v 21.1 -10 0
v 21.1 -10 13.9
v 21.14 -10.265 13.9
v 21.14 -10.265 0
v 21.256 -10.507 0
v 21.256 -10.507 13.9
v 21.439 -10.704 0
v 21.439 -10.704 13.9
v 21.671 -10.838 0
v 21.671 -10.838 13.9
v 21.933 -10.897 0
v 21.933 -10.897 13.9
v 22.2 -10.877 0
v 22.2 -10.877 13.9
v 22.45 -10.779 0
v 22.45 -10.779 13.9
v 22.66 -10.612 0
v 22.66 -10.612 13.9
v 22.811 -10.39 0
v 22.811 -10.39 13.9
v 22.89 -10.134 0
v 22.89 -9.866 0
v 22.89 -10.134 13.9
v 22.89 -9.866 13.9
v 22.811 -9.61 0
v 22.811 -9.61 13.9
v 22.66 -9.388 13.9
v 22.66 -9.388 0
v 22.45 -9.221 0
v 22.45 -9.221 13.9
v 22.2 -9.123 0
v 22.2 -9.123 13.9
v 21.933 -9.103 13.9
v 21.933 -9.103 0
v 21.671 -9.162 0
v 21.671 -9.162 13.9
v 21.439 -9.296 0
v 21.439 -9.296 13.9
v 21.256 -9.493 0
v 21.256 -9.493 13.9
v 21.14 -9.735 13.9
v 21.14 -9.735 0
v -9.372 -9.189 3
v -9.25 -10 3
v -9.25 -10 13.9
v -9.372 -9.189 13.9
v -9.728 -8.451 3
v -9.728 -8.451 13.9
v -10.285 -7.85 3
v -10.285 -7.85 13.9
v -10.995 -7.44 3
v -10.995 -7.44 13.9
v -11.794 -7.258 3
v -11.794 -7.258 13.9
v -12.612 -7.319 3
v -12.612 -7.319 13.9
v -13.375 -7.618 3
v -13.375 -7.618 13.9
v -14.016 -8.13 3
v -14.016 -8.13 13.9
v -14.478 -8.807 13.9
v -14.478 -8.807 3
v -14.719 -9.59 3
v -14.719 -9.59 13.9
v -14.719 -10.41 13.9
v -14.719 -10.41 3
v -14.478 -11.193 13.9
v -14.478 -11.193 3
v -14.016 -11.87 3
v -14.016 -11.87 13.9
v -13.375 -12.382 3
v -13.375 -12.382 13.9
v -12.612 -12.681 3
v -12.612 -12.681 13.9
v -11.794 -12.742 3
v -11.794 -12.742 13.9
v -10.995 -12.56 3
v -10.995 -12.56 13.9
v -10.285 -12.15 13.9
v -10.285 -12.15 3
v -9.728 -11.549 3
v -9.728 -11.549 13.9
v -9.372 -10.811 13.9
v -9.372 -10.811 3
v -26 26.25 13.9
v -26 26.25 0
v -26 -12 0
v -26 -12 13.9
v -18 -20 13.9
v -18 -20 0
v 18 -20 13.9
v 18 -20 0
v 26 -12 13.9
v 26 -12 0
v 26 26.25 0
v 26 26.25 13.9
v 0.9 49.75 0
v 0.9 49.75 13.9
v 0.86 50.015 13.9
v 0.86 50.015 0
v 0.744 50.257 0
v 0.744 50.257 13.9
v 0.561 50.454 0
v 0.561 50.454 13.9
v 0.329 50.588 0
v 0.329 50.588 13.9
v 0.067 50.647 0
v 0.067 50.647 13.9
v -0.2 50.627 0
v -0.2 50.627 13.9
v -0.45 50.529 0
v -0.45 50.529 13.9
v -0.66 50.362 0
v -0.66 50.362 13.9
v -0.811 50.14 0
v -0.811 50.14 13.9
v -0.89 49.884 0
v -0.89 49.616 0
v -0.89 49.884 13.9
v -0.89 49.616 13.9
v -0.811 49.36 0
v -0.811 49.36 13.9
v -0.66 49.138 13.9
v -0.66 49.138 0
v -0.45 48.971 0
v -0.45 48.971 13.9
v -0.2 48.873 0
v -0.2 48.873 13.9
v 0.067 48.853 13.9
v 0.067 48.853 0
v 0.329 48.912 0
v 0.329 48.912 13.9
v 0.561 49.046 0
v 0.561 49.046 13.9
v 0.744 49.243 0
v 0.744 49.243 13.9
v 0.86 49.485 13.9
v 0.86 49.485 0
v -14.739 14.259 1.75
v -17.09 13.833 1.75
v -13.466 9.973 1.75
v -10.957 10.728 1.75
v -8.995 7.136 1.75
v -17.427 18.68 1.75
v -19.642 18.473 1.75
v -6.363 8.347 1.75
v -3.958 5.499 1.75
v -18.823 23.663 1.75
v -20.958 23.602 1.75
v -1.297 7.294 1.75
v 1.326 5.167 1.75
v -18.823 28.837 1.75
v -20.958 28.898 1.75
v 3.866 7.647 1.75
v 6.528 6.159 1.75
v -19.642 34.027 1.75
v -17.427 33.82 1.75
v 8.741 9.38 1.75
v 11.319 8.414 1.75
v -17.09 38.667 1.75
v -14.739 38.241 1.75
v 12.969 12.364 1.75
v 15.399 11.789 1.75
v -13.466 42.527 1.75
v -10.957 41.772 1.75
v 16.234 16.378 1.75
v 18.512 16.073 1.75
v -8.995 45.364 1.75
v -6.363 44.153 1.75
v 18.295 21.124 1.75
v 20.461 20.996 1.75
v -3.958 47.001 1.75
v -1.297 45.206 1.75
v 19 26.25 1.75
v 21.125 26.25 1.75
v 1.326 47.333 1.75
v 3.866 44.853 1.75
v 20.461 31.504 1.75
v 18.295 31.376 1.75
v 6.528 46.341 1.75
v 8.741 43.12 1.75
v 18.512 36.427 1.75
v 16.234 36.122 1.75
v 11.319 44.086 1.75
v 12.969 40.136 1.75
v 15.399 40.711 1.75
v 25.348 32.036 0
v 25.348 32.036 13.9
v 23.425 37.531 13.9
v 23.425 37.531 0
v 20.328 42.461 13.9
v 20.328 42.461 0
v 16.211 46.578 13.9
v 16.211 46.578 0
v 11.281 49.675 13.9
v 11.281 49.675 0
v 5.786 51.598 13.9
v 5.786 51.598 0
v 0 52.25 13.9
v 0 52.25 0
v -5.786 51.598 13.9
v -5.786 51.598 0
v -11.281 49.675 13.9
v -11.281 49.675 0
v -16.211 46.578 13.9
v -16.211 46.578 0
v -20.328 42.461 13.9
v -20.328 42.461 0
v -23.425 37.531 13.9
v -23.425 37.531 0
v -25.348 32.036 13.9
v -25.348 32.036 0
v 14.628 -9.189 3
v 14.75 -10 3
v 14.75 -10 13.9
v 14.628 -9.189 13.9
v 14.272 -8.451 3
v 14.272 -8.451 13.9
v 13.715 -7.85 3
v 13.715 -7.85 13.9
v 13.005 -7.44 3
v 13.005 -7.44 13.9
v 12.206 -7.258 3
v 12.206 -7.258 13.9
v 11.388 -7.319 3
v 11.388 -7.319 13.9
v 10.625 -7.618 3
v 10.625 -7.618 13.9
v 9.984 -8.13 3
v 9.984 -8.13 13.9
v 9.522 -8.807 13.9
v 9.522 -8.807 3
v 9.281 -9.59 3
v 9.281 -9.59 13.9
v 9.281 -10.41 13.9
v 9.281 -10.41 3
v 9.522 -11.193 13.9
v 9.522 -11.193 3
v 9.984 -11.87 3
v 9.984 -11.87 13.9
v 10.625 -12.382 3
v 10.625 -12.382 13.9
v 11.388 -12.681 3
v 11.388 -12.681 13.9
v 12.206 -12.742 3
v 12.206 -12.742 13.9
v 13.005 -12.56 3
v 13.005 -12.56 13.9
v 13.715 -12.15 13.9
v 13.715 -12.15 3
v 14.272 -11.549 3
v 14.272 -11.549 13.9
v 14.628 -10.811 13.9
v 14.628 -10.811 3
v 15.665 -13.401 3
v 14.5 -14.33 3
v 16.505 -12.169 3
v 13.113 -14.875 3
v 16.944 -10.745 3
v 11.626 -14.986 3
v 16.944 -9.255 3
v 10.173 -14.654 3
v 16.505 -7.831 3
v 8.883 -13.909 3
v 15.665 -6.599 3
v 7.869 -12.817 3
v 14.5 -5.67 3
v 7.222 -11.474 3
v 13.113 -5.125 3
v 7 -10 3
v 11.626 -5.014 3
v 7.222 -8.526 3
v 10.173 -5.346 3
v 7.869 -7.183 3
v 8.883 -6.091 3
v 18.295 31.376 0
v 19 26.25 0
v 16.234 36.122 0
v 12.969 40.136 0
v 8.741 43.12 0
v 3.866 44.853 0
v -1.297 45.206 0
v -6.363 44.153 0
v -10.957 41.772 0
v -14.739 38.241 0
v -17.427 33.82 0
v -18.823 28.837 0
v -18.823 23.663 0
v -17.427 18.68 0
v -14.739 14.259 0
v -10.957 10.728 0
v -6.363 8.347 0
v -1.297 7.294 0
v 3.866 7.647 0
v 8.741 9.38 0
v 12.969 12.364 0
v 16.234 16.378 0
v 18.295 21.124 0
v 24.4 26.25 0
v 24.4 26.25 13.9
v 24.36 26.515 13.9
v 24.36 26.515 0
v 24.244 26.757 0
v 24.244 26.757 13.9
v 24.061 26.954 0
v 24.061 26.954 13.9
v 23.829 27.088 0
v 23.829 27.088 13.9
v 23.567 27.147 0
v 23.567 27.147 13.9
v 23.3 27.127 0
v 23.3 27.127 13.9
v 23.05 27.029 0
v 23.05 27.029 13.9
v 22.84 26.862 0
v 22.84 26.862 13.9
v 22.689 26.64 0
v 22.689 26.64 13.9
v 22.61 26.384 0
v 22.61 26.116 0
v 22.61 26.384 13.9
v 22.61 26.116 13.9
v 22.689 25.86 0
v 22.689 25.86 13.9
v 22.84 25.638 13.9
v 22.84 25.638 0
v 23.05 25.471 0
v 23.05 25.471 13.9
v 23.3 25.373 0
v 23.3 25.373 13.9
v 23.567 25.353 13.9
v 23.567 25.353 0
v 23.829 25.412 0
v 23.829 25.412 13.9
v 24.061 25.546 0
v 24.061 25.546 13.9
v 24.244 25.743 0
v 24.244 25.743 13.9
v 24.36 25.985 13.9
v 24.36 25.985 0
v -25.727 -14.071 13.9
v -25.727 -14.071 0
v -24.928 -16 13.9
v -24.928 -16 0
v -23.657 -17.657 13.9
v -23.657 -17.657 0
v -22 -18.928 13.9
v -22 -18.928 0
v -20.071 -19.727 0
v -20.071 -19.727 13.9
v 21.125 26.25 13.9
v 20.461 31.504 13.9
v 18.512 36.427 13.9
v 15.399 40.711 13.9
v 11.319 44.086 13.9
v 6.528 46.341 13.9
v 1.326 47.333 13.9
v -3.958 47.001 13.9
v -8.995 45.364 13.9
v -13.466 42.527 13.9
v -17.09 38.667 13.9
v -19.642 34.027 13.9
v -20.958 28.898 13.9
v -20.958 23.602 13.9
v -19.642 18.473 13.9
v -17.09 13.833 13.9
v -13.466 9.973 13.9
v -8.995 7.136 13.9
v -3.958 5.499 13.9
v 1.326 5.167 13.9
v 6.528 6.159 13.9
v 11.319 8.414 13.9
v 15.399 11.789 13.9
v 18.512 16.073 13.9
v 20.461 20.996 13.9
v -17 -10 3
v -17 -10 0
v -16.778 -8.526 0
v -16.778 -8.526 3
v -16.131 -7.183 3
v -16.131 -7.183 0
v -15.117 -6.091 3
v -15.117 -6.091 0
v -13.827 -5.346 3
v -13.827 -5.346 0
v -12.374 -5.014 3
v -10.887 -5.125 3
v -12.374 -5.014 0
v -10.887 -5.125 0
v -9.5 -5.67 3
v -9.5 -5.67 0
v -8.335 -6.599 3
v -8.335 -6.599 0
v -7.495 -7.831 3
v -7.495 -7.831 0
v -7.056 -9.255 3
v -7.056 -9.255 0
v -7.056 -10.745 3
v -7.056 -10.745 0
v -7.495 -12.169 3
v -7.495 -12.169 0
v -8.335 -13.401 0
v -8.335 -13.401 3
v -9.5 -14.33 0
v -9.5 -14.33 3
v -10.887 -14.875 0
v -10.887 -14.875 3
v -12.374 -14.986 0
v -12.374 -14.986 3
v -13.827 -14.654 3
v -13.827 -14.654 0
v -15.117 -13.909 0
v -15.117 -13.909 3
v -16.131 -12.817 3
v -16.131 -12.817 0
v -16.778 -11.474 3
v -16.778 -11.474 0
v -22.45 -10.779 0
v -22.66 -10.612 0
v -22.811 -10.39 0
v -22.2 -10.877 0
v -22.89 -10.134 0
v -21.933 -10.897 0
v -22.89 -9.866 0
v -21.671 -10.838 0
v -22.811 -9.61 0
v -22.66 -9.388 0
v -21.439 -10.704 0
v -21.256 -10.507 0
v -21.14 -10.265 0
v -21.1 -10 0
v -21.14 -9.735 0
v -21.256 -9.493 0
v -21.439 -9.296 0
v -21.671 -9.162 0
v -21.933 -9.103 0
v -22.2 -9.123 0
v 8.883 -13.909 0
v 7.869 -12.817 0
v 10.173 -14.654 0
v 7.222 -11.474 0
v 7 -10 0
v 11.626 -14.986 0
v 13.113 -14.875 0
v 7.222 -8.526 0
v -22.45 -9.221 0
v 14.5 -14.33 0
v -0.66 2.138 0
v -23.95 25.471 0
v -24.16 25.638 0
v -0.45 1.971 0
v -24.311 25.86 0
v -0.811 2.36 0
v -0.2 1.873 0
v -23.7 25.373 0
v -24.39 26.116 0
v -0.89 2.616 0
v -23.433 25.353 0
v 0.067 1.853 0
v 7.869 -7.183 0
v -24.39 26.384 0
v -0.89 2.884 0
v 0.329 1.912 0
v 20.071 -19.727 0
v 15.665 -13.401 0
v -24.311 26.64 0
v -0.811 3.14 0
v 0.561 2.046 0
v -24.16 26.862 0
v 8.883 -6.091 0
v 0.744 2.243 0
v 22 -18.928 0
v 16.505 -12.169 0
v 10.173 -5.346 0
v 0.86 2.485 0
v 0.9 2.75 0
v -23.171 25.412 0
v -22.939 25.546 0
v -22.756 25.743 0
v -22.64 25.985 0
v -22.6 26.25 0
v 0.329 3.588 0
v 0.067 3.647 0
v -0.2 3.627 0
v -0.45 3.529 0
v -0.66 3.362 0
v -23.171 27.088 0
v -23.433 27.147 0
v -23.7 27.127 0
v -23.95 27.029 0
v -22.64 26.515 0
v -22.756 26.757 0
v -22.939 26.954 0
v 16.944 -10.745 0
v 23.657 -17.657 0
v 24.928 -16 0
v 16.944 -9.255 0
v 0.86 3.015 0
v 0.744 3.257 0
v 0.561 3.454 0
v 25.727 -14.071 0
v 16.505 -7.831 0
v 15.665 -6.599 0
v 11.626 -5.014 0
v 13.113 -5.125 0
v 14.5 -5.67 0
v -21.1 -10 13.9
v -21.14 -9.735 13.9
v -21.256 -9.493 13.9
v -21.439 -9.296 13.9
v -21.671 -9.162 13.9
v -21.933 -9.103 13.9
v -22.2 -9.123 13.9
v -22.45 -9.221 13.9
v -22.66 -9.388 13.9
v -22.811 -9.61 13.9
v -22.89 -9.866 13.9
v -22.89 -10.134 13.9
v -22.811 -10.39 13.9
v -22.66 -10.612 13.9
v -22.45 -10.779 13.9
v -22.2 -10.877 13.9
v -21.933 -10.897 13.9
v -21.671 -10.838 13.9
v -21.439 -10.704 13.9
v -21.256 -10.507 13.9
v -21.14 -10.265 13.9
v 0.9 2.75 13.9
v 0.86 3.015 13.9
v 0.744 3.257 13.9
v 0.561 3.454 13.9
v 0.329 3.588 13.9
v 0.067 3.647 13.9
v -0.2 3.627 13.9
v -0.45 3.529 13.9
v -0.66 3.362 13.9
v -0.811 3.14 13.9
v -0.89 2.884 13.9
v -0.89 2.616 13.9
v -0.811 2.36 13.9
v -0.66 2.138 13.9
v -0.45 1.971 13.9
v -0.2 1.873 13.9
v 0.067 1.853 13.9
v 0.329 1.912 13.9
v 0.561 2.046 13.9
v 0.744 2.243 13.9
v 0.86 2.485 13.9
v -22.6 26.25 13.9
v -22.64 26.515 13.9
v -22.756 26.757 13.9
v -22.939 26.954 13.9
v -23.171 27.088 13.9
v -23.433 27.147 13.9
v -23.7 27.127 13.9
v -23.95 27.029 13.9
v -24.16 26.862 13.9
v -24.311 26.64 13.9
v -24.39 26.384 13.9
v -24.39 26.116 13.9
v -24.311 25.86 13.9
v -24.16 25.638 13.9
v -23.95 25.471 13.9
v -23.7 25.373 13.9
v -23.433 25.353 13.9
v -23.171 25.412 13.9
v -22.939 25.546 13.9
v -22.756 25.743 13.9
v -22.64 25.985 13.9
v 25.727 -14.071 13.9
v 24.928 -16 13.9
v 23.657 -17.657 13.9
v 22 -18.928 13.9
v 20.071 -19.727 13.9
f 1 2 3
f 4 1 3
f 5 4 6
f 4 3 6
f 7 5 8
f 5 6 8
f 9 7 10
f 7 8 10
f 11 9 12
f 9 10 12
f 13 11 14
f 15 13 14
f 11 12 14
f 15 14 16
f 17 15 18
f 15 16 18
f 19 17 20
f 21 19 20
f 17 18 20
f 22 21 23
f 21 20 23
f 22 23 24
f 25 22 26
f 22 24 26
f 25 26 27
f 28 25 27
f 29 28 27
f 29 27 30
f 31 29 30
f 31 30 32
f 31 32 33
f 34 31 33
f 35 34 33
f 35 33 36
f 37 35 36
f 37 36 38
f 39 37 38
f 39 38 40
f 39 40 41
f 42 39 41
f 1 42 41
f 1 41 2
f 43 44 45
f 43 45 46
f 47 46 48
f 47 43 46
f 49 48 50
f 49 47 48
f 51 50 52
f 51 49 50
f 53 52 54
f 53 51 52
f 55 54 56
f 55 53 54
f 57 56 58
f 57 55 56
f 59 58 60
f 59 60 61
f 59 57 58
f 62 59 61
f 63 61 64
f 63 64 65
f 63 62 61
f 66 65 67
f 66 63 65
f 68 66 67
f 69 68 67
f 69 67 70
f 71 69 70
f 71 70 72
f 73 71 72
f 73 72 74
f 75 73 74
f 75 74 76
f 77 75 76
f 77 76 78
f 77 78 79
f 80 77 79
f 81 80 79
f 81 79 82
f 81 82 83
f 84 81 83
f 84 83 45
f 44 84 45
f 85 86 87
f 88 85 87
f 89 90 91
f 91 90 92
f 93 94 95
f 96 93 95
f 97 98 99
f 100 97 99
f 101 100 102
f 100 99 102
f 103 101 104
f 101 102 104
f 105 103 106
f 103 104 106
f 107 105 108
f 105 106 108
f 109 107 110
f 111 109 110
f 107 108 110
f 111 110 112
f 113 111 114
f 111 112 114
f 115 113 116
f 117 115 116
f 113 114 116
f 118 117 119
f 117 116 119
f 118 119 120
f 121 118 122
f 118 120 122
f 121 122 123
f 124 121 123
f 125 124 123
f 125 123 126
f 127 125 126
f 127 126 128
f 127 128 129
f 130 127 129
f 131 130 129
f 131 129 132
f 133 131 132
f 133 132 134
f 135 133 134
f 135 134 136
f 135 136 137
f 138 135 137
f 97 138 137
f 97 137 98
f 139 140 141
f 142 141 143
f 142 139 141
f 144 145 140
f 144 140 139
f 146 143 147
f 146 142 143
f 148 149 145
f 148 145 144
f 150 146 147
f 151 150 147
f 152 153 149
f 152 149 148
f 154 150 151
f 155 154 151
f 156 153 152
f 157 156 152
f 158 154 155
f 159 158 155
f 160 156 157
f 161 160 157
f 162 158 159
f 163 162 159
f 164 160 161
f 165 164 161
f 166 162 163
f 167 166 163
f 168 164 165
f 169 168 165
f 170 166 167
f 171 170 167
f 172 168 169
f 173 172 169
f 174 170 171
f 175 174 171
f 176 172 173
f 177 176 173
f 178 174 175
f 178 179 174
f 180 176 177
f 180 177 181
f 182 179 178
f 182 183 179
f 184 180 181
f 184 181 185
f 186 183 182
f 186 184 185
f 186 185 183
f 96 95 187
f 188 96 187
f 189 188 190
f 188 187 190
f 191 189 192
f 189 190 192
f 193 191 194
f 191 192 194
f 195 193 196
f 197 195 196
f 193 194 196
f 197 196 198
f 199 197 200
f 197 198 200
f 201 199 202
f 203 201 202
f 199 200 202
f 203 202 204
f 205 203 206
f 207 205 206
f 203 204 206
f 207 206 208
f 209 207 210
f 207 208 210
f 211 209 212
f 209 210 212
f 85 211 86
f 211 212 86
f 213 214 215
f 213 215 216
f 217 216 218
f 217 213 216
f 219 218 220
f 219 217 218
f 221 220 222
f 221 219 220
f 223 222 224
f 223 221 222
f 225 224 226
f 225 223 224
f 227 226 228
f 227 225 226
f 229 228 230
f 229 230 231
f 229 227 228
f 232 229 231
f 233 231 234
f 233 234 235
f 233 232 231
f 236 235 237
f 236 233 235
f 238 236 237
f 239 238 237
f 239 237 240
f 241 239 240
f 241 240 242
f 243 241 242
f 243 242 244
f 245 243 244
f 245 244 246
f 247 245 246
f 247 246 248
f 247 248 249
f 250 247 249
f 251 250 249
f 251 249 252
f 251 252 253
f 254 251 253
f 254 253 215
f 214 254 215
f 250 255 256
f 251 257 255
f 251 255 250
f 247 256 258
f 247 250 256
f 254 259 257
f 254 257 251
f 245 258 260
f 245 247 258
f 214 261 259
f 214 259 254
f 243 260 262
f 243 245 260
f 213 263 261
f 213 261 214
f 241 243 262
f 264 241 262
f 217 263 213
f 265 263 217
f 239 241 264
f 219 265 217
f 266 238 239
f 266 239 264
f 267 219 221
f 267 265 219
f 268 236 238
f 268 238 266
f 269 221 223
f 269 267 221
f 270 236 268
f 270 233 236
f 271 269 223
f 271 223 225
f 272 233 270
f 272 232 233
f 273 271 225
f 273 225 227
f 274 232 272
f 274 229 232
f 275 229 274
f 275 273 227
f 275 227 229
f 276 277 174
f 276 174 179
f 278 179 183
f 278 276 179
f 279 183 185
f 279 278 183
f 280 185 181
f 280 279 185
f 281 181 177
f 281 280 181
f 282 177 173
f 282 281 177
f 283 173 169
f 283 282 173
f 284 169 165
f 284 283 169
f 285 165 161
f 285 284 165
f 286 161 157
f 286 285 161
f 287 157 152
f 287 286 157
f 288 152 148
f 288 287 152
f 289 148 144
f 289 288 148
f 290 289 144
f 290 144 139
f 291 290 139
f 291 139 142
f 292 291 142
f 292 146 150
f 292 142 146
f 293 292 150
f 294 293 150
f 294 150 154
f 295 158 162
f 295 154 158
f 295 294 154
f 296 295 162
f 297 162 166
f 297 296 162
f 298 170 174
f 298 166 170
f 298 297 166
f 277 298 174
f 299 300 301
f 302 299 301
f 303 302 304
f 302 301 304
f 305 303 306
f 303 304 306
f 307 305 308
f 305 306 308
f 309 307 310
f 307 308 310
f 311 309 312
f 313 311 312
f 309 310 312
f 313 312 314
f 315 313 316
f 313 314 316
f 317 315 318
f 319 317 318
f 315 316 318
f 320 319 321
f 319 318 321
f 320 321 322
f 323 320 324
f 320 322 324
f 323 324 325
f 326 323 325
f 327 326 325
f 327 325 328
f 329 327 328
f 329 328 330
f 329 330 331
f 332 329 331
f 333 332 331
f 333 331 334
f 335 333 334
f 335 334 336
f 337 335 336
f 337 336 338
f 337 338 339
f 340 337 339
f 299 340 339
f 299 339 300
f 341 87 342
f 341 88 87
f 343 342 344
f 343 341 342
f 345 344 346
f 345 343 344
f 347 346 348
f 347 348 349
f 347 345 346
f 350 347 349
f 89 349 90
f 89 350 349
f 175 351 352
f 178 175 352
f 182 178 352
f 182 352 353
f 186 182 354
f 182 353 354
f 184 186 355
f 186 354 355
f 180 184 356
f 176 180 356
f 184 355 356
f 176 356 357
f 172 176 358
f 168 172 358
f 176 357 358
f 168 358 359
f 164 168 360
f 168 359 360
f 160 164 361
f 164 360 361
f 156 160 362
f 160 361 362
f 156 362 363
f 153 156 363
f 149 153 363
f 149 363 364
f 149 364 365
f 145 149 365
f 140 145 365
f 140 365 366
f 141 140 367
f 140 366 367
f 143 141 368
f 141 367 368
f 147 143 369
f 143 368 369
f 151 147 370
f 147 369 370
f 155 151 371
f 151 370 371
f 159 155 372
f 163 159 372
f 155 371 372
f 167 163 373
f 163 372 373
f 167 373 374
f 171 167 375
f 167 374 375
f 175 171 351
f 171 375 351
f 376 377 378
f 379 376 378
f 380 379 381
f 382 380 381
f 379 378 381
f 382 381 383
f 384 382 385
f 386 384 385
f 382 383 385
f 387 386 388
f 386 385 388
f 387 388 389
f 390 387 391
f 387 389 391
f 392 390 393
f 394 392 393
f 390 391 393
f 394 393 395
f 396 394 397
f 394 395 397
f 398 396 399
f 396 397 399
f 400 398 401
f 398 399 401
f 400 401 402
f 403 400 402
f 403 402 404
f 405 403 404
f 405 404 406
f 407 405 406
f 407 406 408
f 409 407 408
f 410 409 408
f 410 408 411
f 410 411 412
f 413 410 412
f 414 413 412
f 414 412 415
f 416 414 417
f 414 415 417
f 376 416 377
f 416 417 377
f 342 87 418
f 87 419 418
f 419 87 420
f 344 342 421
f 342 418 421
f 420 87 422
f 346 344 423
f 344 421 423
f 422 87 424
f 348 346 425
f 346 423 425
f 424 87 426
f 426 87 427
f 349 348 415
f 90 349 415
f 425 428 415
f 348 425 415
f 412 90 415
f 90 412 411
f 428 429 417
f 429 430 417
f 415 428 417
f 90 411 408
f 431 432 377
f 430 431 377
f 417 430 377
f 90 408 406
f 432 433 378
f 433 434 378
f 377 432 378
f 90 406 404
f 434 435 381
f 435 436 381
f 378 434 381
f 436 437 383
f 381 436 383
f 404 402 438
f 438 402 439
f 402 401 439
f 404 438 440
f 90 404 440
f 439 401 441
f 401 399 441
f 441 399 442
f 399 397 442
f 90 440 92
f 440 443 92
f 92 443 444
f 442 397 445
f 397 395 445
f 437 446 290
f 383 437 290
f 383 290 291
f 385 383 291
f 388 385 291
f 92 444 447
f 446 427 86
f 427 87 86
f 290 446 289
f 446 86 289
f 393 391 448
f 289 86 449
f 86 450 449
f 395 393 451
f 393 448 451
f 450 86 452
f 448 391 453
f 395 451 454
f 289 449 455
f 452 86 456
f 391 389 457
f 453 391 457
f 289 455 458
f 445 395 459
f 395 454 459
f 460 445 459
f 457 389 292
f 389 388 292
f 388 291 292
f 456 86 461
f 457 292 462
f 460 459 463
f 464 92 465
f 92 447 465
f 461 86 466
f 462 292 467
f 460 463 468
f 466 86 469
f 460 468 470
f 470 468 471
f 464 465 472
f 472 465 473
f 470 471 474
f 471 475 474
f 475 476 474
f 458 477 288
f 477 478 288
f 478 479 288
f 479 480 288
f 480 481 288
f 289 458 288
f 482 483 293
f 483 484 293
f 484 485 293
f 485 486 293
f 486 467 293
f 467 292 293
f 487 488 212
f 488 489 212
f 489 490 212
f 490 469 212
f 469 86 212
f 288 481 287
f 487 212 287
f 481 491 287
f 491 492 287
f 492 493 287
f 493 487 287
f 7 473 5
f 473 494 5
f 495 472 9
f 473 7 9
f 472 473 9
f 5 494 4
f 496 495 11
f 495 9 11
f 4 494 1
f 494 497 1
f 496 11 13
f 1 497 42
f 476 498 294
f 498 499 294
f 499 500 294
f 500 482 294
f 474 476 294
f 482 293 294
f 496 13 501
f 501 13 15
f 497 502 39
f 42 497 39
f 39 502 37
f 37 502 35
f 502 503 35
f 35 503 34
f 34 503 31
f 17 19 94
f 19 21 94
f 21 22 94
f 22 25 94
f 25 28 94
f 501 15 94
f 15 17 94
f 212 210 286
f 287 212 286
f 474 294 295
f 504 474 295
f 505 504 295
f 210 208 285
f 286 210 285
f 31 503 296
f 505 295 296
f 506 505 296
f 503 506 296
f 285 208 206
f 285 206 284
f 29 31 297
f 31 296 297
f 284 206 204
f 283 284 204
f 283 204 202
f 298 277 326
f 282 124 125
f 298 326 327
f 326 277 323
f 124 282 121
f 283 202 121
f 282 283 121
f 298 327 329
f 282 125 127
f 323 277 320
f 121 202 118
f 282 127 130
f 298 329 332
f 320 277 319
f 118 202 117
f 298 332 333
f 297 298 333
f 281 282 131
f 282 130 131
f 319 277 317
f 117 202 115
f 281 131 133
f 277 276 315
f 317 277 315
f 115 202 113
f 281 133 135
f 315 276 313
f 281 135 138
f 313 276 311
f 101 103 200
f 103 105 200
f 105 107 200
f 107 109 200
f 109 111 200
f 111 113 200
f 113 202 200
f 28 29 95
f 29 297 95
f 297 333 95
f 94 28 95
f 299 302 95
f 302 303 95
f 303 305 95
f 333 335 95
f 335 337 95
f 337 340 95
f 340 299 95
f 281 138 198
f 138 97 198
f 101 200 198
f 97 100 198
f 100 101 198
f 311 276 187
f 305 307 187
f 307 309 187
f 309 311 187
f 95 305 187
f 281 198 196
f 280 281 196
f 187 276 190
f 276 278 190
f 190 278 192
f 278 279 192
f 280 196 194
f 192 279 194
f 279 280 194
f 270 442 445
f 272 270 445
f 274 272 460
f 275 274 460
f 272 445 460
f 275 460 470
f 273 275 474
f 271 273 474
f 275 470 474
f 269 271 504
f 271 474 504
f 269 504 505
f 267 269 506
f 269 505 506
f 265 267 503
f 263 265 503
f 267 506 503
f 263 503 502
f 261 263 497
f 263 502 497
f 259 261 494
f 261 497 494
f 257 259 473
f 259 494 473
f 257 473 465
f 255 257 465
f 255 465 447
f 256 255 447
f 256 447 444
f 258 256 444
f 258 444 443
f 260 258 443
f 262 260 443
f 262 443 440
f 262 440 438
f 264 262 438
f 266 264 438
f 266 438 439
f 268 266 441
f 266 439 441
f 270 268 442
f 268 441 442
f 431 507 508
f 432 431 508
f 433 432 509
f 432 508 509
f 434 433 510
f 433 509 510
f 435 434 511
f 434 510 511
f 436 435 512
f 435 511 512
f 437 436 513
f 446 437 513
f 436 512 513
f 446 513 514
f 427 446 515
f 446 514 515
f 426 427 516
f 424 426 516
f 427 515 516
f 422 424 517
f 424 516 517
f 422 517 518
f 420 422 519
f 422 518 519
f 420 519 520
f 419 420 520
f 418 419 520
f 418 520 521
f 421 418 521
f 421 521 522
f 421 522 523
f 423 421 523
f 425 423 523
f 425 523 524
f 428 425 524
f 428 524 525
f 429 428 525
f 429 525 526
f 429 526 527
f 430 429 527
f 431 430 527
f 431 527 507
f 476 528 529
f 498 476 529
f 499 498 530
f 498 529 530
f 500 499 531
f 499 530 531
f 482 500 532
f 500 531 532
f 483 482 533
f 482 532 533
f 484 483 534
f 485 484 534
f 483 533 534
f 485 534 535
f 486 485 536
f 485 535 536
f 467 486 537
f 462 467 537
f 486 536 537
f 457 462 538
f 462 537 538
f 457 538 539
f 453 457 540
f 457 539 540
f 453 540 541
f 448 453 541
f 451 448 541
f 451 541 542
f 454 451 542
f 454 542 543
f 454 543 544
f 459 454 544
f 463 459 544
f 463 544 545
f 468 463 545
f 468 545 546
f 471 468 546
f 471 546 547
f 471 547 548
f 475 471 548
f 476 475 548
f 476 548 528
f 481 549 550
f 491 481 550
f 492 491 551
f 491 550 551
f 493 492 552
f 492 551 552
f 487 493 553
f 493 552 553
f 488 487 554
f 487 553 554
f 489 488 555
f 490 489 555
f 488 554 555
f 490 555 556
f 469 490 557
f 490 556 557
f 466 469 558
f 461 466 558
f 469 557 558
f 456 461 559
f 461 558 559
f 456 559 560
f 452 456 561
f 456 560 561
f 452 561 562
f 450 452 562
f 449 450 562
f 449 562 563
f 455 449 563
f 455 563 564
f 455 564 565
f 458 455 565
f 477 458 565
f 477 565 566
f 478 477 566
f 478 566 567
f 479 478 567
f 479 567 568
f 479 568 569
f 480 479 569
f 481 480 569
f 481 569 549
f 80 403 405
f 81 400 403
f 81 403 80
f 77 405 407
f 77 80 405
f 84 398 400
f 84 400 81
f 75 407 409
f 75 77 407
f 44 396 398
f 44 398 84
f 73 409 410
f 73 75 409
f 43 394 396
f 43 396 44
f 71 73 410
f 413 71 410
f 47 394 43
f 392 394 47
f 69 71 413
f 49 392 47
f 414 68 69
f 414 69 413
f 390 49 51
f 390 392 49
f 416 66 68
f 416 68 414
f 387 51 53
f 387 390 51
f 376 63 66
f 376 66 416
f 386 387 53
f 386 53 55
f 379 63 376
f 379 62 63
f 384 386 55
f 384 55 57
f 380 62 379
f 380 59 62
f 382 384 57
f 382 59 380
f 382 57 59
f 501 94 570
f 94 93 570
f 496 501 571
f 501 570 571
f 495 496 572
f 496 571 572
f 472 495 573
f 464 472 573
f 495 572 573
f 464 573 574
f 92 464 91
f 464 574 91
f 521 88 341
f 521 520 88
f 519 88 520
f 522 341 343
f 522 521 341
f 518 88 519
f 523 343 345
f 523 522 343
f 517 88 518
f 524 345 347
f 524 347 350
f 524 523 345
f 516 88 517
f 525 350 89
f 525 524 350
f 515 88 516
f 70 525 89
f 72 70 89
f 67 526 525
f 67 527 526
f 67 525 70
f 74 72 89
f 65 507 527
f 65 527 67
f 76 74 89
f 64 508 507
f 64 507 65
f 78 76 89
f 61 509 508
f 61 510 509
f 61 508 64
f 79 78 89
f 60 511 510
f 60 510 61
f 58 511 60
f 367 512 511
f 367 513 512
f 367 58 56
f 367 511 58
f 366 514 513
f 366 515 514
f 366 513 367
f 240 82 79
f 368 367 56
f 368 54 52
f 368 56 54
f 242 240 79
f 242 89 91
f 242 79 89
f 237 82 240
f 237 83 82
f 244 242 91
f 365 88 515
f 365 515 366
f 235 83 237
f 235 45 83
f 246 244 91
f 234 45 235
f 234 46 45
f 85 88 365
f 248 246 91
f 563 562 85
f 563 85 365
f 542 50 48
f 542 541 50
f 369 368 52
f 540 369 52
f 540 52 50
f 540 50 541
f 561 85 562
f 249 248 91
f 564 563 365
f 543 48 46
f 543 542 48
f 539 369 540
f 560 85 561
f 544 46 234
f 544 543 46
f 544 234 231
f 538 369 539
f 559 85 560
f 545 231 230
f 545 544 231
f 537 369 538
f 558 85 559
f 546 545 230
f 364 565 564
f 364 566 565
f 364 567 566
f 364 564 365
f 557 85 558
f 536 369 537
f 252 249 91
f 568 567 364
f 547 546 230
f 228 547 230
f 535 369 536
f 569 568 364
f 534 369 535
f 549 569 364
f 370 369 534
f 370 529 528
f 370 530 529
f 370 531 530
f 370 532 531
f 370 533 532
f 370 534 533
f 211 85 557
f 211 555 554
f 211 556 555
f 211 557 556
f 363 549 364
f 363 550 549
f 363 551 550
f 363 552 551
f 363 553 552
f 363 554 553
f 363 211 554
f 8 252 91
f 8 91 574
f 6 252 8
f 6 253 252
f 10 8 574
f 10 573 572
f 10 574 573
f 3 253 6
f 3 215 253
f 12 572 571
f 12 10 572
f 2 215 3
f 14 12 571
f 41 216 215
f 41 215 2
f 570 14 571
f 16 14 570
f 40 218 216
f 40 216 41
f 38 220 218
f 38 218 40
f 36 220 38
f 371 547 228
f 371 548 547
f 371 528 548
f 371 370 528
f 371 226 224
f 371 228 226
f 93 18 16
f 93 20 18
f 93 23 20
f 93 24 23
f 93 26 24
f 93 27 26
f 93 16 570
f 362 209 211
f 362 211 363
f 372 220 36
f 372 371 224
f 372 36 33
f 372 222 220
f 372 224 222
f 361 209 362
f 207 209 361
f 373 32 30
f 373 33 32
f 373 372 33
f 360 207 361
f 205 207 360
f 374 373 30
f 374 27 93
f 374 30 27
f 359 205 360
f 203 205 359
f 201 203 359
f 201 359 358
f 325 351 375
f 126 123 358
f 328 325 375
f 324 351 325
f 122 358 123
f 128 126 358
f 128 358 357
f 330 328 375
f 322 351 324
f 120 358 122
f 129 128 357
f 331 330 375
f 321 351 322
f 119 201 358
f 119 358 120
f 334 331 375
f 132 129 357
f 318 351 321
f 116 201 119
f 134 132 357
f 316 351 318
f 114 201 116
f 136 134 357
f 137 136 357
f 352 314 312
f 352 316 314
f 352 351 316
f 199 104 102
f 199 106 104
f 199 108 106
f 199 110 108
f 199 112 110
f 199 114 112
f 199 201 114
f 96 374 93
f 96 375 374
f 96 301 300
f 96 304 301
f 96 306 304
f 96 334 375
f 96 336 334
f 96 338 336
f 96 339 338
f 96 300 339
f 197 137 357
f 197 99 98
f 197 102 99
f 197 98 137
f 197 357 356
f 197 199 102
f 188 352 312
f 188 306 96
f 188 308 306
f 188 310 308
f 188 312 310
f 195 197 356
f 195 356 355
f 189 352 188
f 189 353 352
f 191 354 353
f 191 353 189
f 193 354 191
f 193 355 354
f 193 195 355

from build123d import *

# Parameters (mm, degrees)
SKETCH_2_R          = 19
SKETCH_2_R_2        = 2.75
EXTRUDE_1_DEPTH     = 13.9
SKETCH_3_R          = 21.125
CUT_EXTRUDE_1_DEPTH = 12.15
SKETCH_4_R          = 5
CUT_EXTRUDE_2_DEPTH = 3
FILLET_1_R          = 8
SKETCH_5_R          = 0.9
CUT_EXTRUDE_3_DEPTH = 60.993937194


with BuildPart() as part:
    # Эскиз2 → Бобышка-Вытянуть1 (new body)
    with BuildSketch(Plane.XY):
        with BuildLine():
            ThreePointArc((26, 26.25), (0, 52.25), (-26, 26.25))
            Line((-26, 26.25), (-26, -20))
            Line((-26, -20), (26, -20))
            Line((26, -20), (26, 26.25))
        make_face()
        with Locations((0, 26.25)):
            Circle(SKETCH_2_R, mode=Mode.SUBTRACT)
        with Locations((12, -10)):
            Circle(SKETCH_2_R_2, mode=Mode.SUBTRACT)
        with Locations((-12, -10)):
            Circle(SKETCH_2_R_2, mode=Mode.SUBTRACT)
    extrude(amount=EXTRUDE_1_DEPTH)

    # Эскиз3 → Вырез-Вытянуть1 (cut)
    with BuildSketch(Plane.XY.offset(13.9)):
        with Locations((0, 26.25)):
            Circle(SKETCH_3_R)
    extrude(amount=-CUT_EXTRUDE_1_DEPTH, mode=Mode.SUBTRACT)

    # Эскиз4 → Вырез-Вытянуть2 (cut)
    with BuildSketch(Plane(origin=(0, 0, 0), x_dir=(-1, 0, 0), z_dir=(0, 0, -1))):
        with Locations((-12, -10)):
            Circle(SKETCH_4_R)
        with Locations((12, -10)):
            Circle(SKETCH_4_R)
    extrude(amount=-CUT_EXTRUDE_2_DEPTH, mode=Mode.SUBTRACT)

    # Скругление1
    fillet_1_edges = [part.edges().sort_by_distance(p)[0] for p in [
        (26, -20, 6.95),
        (-26, -20, 6.95),
    ]]
    fillet(fillet_1_edges, radius=FILLET_1_R)

    # Эскиз5 → Вырез-Вытянуть3 (cut, through all)
    with BuildSketch(Plane.XY.offset(13.9)):
        with Locations((0, 49.75)):
            Circle(SKETCH_5_R)
        with Locations((-23.5, 26.25)):
            Circle(SKETCH_5_R)
        with Locations((0, 2.75)):
            Circle(SKETCH_5_R)
        with Locations((23.5, 26.25)):
            Circle(SKETCH_5_R)
        with Locations((-22, -10)):
            Circle(SKETCH_5_R)
        with Locations(Location((22, -10, 0), (0, 0, 180))):
            Circle(SKETCH_5_R)
    extrude(amount=-CUT_EXTRUDE_3_DEPTH, mode=Mode.SUBTRACT)


solid = part.part
